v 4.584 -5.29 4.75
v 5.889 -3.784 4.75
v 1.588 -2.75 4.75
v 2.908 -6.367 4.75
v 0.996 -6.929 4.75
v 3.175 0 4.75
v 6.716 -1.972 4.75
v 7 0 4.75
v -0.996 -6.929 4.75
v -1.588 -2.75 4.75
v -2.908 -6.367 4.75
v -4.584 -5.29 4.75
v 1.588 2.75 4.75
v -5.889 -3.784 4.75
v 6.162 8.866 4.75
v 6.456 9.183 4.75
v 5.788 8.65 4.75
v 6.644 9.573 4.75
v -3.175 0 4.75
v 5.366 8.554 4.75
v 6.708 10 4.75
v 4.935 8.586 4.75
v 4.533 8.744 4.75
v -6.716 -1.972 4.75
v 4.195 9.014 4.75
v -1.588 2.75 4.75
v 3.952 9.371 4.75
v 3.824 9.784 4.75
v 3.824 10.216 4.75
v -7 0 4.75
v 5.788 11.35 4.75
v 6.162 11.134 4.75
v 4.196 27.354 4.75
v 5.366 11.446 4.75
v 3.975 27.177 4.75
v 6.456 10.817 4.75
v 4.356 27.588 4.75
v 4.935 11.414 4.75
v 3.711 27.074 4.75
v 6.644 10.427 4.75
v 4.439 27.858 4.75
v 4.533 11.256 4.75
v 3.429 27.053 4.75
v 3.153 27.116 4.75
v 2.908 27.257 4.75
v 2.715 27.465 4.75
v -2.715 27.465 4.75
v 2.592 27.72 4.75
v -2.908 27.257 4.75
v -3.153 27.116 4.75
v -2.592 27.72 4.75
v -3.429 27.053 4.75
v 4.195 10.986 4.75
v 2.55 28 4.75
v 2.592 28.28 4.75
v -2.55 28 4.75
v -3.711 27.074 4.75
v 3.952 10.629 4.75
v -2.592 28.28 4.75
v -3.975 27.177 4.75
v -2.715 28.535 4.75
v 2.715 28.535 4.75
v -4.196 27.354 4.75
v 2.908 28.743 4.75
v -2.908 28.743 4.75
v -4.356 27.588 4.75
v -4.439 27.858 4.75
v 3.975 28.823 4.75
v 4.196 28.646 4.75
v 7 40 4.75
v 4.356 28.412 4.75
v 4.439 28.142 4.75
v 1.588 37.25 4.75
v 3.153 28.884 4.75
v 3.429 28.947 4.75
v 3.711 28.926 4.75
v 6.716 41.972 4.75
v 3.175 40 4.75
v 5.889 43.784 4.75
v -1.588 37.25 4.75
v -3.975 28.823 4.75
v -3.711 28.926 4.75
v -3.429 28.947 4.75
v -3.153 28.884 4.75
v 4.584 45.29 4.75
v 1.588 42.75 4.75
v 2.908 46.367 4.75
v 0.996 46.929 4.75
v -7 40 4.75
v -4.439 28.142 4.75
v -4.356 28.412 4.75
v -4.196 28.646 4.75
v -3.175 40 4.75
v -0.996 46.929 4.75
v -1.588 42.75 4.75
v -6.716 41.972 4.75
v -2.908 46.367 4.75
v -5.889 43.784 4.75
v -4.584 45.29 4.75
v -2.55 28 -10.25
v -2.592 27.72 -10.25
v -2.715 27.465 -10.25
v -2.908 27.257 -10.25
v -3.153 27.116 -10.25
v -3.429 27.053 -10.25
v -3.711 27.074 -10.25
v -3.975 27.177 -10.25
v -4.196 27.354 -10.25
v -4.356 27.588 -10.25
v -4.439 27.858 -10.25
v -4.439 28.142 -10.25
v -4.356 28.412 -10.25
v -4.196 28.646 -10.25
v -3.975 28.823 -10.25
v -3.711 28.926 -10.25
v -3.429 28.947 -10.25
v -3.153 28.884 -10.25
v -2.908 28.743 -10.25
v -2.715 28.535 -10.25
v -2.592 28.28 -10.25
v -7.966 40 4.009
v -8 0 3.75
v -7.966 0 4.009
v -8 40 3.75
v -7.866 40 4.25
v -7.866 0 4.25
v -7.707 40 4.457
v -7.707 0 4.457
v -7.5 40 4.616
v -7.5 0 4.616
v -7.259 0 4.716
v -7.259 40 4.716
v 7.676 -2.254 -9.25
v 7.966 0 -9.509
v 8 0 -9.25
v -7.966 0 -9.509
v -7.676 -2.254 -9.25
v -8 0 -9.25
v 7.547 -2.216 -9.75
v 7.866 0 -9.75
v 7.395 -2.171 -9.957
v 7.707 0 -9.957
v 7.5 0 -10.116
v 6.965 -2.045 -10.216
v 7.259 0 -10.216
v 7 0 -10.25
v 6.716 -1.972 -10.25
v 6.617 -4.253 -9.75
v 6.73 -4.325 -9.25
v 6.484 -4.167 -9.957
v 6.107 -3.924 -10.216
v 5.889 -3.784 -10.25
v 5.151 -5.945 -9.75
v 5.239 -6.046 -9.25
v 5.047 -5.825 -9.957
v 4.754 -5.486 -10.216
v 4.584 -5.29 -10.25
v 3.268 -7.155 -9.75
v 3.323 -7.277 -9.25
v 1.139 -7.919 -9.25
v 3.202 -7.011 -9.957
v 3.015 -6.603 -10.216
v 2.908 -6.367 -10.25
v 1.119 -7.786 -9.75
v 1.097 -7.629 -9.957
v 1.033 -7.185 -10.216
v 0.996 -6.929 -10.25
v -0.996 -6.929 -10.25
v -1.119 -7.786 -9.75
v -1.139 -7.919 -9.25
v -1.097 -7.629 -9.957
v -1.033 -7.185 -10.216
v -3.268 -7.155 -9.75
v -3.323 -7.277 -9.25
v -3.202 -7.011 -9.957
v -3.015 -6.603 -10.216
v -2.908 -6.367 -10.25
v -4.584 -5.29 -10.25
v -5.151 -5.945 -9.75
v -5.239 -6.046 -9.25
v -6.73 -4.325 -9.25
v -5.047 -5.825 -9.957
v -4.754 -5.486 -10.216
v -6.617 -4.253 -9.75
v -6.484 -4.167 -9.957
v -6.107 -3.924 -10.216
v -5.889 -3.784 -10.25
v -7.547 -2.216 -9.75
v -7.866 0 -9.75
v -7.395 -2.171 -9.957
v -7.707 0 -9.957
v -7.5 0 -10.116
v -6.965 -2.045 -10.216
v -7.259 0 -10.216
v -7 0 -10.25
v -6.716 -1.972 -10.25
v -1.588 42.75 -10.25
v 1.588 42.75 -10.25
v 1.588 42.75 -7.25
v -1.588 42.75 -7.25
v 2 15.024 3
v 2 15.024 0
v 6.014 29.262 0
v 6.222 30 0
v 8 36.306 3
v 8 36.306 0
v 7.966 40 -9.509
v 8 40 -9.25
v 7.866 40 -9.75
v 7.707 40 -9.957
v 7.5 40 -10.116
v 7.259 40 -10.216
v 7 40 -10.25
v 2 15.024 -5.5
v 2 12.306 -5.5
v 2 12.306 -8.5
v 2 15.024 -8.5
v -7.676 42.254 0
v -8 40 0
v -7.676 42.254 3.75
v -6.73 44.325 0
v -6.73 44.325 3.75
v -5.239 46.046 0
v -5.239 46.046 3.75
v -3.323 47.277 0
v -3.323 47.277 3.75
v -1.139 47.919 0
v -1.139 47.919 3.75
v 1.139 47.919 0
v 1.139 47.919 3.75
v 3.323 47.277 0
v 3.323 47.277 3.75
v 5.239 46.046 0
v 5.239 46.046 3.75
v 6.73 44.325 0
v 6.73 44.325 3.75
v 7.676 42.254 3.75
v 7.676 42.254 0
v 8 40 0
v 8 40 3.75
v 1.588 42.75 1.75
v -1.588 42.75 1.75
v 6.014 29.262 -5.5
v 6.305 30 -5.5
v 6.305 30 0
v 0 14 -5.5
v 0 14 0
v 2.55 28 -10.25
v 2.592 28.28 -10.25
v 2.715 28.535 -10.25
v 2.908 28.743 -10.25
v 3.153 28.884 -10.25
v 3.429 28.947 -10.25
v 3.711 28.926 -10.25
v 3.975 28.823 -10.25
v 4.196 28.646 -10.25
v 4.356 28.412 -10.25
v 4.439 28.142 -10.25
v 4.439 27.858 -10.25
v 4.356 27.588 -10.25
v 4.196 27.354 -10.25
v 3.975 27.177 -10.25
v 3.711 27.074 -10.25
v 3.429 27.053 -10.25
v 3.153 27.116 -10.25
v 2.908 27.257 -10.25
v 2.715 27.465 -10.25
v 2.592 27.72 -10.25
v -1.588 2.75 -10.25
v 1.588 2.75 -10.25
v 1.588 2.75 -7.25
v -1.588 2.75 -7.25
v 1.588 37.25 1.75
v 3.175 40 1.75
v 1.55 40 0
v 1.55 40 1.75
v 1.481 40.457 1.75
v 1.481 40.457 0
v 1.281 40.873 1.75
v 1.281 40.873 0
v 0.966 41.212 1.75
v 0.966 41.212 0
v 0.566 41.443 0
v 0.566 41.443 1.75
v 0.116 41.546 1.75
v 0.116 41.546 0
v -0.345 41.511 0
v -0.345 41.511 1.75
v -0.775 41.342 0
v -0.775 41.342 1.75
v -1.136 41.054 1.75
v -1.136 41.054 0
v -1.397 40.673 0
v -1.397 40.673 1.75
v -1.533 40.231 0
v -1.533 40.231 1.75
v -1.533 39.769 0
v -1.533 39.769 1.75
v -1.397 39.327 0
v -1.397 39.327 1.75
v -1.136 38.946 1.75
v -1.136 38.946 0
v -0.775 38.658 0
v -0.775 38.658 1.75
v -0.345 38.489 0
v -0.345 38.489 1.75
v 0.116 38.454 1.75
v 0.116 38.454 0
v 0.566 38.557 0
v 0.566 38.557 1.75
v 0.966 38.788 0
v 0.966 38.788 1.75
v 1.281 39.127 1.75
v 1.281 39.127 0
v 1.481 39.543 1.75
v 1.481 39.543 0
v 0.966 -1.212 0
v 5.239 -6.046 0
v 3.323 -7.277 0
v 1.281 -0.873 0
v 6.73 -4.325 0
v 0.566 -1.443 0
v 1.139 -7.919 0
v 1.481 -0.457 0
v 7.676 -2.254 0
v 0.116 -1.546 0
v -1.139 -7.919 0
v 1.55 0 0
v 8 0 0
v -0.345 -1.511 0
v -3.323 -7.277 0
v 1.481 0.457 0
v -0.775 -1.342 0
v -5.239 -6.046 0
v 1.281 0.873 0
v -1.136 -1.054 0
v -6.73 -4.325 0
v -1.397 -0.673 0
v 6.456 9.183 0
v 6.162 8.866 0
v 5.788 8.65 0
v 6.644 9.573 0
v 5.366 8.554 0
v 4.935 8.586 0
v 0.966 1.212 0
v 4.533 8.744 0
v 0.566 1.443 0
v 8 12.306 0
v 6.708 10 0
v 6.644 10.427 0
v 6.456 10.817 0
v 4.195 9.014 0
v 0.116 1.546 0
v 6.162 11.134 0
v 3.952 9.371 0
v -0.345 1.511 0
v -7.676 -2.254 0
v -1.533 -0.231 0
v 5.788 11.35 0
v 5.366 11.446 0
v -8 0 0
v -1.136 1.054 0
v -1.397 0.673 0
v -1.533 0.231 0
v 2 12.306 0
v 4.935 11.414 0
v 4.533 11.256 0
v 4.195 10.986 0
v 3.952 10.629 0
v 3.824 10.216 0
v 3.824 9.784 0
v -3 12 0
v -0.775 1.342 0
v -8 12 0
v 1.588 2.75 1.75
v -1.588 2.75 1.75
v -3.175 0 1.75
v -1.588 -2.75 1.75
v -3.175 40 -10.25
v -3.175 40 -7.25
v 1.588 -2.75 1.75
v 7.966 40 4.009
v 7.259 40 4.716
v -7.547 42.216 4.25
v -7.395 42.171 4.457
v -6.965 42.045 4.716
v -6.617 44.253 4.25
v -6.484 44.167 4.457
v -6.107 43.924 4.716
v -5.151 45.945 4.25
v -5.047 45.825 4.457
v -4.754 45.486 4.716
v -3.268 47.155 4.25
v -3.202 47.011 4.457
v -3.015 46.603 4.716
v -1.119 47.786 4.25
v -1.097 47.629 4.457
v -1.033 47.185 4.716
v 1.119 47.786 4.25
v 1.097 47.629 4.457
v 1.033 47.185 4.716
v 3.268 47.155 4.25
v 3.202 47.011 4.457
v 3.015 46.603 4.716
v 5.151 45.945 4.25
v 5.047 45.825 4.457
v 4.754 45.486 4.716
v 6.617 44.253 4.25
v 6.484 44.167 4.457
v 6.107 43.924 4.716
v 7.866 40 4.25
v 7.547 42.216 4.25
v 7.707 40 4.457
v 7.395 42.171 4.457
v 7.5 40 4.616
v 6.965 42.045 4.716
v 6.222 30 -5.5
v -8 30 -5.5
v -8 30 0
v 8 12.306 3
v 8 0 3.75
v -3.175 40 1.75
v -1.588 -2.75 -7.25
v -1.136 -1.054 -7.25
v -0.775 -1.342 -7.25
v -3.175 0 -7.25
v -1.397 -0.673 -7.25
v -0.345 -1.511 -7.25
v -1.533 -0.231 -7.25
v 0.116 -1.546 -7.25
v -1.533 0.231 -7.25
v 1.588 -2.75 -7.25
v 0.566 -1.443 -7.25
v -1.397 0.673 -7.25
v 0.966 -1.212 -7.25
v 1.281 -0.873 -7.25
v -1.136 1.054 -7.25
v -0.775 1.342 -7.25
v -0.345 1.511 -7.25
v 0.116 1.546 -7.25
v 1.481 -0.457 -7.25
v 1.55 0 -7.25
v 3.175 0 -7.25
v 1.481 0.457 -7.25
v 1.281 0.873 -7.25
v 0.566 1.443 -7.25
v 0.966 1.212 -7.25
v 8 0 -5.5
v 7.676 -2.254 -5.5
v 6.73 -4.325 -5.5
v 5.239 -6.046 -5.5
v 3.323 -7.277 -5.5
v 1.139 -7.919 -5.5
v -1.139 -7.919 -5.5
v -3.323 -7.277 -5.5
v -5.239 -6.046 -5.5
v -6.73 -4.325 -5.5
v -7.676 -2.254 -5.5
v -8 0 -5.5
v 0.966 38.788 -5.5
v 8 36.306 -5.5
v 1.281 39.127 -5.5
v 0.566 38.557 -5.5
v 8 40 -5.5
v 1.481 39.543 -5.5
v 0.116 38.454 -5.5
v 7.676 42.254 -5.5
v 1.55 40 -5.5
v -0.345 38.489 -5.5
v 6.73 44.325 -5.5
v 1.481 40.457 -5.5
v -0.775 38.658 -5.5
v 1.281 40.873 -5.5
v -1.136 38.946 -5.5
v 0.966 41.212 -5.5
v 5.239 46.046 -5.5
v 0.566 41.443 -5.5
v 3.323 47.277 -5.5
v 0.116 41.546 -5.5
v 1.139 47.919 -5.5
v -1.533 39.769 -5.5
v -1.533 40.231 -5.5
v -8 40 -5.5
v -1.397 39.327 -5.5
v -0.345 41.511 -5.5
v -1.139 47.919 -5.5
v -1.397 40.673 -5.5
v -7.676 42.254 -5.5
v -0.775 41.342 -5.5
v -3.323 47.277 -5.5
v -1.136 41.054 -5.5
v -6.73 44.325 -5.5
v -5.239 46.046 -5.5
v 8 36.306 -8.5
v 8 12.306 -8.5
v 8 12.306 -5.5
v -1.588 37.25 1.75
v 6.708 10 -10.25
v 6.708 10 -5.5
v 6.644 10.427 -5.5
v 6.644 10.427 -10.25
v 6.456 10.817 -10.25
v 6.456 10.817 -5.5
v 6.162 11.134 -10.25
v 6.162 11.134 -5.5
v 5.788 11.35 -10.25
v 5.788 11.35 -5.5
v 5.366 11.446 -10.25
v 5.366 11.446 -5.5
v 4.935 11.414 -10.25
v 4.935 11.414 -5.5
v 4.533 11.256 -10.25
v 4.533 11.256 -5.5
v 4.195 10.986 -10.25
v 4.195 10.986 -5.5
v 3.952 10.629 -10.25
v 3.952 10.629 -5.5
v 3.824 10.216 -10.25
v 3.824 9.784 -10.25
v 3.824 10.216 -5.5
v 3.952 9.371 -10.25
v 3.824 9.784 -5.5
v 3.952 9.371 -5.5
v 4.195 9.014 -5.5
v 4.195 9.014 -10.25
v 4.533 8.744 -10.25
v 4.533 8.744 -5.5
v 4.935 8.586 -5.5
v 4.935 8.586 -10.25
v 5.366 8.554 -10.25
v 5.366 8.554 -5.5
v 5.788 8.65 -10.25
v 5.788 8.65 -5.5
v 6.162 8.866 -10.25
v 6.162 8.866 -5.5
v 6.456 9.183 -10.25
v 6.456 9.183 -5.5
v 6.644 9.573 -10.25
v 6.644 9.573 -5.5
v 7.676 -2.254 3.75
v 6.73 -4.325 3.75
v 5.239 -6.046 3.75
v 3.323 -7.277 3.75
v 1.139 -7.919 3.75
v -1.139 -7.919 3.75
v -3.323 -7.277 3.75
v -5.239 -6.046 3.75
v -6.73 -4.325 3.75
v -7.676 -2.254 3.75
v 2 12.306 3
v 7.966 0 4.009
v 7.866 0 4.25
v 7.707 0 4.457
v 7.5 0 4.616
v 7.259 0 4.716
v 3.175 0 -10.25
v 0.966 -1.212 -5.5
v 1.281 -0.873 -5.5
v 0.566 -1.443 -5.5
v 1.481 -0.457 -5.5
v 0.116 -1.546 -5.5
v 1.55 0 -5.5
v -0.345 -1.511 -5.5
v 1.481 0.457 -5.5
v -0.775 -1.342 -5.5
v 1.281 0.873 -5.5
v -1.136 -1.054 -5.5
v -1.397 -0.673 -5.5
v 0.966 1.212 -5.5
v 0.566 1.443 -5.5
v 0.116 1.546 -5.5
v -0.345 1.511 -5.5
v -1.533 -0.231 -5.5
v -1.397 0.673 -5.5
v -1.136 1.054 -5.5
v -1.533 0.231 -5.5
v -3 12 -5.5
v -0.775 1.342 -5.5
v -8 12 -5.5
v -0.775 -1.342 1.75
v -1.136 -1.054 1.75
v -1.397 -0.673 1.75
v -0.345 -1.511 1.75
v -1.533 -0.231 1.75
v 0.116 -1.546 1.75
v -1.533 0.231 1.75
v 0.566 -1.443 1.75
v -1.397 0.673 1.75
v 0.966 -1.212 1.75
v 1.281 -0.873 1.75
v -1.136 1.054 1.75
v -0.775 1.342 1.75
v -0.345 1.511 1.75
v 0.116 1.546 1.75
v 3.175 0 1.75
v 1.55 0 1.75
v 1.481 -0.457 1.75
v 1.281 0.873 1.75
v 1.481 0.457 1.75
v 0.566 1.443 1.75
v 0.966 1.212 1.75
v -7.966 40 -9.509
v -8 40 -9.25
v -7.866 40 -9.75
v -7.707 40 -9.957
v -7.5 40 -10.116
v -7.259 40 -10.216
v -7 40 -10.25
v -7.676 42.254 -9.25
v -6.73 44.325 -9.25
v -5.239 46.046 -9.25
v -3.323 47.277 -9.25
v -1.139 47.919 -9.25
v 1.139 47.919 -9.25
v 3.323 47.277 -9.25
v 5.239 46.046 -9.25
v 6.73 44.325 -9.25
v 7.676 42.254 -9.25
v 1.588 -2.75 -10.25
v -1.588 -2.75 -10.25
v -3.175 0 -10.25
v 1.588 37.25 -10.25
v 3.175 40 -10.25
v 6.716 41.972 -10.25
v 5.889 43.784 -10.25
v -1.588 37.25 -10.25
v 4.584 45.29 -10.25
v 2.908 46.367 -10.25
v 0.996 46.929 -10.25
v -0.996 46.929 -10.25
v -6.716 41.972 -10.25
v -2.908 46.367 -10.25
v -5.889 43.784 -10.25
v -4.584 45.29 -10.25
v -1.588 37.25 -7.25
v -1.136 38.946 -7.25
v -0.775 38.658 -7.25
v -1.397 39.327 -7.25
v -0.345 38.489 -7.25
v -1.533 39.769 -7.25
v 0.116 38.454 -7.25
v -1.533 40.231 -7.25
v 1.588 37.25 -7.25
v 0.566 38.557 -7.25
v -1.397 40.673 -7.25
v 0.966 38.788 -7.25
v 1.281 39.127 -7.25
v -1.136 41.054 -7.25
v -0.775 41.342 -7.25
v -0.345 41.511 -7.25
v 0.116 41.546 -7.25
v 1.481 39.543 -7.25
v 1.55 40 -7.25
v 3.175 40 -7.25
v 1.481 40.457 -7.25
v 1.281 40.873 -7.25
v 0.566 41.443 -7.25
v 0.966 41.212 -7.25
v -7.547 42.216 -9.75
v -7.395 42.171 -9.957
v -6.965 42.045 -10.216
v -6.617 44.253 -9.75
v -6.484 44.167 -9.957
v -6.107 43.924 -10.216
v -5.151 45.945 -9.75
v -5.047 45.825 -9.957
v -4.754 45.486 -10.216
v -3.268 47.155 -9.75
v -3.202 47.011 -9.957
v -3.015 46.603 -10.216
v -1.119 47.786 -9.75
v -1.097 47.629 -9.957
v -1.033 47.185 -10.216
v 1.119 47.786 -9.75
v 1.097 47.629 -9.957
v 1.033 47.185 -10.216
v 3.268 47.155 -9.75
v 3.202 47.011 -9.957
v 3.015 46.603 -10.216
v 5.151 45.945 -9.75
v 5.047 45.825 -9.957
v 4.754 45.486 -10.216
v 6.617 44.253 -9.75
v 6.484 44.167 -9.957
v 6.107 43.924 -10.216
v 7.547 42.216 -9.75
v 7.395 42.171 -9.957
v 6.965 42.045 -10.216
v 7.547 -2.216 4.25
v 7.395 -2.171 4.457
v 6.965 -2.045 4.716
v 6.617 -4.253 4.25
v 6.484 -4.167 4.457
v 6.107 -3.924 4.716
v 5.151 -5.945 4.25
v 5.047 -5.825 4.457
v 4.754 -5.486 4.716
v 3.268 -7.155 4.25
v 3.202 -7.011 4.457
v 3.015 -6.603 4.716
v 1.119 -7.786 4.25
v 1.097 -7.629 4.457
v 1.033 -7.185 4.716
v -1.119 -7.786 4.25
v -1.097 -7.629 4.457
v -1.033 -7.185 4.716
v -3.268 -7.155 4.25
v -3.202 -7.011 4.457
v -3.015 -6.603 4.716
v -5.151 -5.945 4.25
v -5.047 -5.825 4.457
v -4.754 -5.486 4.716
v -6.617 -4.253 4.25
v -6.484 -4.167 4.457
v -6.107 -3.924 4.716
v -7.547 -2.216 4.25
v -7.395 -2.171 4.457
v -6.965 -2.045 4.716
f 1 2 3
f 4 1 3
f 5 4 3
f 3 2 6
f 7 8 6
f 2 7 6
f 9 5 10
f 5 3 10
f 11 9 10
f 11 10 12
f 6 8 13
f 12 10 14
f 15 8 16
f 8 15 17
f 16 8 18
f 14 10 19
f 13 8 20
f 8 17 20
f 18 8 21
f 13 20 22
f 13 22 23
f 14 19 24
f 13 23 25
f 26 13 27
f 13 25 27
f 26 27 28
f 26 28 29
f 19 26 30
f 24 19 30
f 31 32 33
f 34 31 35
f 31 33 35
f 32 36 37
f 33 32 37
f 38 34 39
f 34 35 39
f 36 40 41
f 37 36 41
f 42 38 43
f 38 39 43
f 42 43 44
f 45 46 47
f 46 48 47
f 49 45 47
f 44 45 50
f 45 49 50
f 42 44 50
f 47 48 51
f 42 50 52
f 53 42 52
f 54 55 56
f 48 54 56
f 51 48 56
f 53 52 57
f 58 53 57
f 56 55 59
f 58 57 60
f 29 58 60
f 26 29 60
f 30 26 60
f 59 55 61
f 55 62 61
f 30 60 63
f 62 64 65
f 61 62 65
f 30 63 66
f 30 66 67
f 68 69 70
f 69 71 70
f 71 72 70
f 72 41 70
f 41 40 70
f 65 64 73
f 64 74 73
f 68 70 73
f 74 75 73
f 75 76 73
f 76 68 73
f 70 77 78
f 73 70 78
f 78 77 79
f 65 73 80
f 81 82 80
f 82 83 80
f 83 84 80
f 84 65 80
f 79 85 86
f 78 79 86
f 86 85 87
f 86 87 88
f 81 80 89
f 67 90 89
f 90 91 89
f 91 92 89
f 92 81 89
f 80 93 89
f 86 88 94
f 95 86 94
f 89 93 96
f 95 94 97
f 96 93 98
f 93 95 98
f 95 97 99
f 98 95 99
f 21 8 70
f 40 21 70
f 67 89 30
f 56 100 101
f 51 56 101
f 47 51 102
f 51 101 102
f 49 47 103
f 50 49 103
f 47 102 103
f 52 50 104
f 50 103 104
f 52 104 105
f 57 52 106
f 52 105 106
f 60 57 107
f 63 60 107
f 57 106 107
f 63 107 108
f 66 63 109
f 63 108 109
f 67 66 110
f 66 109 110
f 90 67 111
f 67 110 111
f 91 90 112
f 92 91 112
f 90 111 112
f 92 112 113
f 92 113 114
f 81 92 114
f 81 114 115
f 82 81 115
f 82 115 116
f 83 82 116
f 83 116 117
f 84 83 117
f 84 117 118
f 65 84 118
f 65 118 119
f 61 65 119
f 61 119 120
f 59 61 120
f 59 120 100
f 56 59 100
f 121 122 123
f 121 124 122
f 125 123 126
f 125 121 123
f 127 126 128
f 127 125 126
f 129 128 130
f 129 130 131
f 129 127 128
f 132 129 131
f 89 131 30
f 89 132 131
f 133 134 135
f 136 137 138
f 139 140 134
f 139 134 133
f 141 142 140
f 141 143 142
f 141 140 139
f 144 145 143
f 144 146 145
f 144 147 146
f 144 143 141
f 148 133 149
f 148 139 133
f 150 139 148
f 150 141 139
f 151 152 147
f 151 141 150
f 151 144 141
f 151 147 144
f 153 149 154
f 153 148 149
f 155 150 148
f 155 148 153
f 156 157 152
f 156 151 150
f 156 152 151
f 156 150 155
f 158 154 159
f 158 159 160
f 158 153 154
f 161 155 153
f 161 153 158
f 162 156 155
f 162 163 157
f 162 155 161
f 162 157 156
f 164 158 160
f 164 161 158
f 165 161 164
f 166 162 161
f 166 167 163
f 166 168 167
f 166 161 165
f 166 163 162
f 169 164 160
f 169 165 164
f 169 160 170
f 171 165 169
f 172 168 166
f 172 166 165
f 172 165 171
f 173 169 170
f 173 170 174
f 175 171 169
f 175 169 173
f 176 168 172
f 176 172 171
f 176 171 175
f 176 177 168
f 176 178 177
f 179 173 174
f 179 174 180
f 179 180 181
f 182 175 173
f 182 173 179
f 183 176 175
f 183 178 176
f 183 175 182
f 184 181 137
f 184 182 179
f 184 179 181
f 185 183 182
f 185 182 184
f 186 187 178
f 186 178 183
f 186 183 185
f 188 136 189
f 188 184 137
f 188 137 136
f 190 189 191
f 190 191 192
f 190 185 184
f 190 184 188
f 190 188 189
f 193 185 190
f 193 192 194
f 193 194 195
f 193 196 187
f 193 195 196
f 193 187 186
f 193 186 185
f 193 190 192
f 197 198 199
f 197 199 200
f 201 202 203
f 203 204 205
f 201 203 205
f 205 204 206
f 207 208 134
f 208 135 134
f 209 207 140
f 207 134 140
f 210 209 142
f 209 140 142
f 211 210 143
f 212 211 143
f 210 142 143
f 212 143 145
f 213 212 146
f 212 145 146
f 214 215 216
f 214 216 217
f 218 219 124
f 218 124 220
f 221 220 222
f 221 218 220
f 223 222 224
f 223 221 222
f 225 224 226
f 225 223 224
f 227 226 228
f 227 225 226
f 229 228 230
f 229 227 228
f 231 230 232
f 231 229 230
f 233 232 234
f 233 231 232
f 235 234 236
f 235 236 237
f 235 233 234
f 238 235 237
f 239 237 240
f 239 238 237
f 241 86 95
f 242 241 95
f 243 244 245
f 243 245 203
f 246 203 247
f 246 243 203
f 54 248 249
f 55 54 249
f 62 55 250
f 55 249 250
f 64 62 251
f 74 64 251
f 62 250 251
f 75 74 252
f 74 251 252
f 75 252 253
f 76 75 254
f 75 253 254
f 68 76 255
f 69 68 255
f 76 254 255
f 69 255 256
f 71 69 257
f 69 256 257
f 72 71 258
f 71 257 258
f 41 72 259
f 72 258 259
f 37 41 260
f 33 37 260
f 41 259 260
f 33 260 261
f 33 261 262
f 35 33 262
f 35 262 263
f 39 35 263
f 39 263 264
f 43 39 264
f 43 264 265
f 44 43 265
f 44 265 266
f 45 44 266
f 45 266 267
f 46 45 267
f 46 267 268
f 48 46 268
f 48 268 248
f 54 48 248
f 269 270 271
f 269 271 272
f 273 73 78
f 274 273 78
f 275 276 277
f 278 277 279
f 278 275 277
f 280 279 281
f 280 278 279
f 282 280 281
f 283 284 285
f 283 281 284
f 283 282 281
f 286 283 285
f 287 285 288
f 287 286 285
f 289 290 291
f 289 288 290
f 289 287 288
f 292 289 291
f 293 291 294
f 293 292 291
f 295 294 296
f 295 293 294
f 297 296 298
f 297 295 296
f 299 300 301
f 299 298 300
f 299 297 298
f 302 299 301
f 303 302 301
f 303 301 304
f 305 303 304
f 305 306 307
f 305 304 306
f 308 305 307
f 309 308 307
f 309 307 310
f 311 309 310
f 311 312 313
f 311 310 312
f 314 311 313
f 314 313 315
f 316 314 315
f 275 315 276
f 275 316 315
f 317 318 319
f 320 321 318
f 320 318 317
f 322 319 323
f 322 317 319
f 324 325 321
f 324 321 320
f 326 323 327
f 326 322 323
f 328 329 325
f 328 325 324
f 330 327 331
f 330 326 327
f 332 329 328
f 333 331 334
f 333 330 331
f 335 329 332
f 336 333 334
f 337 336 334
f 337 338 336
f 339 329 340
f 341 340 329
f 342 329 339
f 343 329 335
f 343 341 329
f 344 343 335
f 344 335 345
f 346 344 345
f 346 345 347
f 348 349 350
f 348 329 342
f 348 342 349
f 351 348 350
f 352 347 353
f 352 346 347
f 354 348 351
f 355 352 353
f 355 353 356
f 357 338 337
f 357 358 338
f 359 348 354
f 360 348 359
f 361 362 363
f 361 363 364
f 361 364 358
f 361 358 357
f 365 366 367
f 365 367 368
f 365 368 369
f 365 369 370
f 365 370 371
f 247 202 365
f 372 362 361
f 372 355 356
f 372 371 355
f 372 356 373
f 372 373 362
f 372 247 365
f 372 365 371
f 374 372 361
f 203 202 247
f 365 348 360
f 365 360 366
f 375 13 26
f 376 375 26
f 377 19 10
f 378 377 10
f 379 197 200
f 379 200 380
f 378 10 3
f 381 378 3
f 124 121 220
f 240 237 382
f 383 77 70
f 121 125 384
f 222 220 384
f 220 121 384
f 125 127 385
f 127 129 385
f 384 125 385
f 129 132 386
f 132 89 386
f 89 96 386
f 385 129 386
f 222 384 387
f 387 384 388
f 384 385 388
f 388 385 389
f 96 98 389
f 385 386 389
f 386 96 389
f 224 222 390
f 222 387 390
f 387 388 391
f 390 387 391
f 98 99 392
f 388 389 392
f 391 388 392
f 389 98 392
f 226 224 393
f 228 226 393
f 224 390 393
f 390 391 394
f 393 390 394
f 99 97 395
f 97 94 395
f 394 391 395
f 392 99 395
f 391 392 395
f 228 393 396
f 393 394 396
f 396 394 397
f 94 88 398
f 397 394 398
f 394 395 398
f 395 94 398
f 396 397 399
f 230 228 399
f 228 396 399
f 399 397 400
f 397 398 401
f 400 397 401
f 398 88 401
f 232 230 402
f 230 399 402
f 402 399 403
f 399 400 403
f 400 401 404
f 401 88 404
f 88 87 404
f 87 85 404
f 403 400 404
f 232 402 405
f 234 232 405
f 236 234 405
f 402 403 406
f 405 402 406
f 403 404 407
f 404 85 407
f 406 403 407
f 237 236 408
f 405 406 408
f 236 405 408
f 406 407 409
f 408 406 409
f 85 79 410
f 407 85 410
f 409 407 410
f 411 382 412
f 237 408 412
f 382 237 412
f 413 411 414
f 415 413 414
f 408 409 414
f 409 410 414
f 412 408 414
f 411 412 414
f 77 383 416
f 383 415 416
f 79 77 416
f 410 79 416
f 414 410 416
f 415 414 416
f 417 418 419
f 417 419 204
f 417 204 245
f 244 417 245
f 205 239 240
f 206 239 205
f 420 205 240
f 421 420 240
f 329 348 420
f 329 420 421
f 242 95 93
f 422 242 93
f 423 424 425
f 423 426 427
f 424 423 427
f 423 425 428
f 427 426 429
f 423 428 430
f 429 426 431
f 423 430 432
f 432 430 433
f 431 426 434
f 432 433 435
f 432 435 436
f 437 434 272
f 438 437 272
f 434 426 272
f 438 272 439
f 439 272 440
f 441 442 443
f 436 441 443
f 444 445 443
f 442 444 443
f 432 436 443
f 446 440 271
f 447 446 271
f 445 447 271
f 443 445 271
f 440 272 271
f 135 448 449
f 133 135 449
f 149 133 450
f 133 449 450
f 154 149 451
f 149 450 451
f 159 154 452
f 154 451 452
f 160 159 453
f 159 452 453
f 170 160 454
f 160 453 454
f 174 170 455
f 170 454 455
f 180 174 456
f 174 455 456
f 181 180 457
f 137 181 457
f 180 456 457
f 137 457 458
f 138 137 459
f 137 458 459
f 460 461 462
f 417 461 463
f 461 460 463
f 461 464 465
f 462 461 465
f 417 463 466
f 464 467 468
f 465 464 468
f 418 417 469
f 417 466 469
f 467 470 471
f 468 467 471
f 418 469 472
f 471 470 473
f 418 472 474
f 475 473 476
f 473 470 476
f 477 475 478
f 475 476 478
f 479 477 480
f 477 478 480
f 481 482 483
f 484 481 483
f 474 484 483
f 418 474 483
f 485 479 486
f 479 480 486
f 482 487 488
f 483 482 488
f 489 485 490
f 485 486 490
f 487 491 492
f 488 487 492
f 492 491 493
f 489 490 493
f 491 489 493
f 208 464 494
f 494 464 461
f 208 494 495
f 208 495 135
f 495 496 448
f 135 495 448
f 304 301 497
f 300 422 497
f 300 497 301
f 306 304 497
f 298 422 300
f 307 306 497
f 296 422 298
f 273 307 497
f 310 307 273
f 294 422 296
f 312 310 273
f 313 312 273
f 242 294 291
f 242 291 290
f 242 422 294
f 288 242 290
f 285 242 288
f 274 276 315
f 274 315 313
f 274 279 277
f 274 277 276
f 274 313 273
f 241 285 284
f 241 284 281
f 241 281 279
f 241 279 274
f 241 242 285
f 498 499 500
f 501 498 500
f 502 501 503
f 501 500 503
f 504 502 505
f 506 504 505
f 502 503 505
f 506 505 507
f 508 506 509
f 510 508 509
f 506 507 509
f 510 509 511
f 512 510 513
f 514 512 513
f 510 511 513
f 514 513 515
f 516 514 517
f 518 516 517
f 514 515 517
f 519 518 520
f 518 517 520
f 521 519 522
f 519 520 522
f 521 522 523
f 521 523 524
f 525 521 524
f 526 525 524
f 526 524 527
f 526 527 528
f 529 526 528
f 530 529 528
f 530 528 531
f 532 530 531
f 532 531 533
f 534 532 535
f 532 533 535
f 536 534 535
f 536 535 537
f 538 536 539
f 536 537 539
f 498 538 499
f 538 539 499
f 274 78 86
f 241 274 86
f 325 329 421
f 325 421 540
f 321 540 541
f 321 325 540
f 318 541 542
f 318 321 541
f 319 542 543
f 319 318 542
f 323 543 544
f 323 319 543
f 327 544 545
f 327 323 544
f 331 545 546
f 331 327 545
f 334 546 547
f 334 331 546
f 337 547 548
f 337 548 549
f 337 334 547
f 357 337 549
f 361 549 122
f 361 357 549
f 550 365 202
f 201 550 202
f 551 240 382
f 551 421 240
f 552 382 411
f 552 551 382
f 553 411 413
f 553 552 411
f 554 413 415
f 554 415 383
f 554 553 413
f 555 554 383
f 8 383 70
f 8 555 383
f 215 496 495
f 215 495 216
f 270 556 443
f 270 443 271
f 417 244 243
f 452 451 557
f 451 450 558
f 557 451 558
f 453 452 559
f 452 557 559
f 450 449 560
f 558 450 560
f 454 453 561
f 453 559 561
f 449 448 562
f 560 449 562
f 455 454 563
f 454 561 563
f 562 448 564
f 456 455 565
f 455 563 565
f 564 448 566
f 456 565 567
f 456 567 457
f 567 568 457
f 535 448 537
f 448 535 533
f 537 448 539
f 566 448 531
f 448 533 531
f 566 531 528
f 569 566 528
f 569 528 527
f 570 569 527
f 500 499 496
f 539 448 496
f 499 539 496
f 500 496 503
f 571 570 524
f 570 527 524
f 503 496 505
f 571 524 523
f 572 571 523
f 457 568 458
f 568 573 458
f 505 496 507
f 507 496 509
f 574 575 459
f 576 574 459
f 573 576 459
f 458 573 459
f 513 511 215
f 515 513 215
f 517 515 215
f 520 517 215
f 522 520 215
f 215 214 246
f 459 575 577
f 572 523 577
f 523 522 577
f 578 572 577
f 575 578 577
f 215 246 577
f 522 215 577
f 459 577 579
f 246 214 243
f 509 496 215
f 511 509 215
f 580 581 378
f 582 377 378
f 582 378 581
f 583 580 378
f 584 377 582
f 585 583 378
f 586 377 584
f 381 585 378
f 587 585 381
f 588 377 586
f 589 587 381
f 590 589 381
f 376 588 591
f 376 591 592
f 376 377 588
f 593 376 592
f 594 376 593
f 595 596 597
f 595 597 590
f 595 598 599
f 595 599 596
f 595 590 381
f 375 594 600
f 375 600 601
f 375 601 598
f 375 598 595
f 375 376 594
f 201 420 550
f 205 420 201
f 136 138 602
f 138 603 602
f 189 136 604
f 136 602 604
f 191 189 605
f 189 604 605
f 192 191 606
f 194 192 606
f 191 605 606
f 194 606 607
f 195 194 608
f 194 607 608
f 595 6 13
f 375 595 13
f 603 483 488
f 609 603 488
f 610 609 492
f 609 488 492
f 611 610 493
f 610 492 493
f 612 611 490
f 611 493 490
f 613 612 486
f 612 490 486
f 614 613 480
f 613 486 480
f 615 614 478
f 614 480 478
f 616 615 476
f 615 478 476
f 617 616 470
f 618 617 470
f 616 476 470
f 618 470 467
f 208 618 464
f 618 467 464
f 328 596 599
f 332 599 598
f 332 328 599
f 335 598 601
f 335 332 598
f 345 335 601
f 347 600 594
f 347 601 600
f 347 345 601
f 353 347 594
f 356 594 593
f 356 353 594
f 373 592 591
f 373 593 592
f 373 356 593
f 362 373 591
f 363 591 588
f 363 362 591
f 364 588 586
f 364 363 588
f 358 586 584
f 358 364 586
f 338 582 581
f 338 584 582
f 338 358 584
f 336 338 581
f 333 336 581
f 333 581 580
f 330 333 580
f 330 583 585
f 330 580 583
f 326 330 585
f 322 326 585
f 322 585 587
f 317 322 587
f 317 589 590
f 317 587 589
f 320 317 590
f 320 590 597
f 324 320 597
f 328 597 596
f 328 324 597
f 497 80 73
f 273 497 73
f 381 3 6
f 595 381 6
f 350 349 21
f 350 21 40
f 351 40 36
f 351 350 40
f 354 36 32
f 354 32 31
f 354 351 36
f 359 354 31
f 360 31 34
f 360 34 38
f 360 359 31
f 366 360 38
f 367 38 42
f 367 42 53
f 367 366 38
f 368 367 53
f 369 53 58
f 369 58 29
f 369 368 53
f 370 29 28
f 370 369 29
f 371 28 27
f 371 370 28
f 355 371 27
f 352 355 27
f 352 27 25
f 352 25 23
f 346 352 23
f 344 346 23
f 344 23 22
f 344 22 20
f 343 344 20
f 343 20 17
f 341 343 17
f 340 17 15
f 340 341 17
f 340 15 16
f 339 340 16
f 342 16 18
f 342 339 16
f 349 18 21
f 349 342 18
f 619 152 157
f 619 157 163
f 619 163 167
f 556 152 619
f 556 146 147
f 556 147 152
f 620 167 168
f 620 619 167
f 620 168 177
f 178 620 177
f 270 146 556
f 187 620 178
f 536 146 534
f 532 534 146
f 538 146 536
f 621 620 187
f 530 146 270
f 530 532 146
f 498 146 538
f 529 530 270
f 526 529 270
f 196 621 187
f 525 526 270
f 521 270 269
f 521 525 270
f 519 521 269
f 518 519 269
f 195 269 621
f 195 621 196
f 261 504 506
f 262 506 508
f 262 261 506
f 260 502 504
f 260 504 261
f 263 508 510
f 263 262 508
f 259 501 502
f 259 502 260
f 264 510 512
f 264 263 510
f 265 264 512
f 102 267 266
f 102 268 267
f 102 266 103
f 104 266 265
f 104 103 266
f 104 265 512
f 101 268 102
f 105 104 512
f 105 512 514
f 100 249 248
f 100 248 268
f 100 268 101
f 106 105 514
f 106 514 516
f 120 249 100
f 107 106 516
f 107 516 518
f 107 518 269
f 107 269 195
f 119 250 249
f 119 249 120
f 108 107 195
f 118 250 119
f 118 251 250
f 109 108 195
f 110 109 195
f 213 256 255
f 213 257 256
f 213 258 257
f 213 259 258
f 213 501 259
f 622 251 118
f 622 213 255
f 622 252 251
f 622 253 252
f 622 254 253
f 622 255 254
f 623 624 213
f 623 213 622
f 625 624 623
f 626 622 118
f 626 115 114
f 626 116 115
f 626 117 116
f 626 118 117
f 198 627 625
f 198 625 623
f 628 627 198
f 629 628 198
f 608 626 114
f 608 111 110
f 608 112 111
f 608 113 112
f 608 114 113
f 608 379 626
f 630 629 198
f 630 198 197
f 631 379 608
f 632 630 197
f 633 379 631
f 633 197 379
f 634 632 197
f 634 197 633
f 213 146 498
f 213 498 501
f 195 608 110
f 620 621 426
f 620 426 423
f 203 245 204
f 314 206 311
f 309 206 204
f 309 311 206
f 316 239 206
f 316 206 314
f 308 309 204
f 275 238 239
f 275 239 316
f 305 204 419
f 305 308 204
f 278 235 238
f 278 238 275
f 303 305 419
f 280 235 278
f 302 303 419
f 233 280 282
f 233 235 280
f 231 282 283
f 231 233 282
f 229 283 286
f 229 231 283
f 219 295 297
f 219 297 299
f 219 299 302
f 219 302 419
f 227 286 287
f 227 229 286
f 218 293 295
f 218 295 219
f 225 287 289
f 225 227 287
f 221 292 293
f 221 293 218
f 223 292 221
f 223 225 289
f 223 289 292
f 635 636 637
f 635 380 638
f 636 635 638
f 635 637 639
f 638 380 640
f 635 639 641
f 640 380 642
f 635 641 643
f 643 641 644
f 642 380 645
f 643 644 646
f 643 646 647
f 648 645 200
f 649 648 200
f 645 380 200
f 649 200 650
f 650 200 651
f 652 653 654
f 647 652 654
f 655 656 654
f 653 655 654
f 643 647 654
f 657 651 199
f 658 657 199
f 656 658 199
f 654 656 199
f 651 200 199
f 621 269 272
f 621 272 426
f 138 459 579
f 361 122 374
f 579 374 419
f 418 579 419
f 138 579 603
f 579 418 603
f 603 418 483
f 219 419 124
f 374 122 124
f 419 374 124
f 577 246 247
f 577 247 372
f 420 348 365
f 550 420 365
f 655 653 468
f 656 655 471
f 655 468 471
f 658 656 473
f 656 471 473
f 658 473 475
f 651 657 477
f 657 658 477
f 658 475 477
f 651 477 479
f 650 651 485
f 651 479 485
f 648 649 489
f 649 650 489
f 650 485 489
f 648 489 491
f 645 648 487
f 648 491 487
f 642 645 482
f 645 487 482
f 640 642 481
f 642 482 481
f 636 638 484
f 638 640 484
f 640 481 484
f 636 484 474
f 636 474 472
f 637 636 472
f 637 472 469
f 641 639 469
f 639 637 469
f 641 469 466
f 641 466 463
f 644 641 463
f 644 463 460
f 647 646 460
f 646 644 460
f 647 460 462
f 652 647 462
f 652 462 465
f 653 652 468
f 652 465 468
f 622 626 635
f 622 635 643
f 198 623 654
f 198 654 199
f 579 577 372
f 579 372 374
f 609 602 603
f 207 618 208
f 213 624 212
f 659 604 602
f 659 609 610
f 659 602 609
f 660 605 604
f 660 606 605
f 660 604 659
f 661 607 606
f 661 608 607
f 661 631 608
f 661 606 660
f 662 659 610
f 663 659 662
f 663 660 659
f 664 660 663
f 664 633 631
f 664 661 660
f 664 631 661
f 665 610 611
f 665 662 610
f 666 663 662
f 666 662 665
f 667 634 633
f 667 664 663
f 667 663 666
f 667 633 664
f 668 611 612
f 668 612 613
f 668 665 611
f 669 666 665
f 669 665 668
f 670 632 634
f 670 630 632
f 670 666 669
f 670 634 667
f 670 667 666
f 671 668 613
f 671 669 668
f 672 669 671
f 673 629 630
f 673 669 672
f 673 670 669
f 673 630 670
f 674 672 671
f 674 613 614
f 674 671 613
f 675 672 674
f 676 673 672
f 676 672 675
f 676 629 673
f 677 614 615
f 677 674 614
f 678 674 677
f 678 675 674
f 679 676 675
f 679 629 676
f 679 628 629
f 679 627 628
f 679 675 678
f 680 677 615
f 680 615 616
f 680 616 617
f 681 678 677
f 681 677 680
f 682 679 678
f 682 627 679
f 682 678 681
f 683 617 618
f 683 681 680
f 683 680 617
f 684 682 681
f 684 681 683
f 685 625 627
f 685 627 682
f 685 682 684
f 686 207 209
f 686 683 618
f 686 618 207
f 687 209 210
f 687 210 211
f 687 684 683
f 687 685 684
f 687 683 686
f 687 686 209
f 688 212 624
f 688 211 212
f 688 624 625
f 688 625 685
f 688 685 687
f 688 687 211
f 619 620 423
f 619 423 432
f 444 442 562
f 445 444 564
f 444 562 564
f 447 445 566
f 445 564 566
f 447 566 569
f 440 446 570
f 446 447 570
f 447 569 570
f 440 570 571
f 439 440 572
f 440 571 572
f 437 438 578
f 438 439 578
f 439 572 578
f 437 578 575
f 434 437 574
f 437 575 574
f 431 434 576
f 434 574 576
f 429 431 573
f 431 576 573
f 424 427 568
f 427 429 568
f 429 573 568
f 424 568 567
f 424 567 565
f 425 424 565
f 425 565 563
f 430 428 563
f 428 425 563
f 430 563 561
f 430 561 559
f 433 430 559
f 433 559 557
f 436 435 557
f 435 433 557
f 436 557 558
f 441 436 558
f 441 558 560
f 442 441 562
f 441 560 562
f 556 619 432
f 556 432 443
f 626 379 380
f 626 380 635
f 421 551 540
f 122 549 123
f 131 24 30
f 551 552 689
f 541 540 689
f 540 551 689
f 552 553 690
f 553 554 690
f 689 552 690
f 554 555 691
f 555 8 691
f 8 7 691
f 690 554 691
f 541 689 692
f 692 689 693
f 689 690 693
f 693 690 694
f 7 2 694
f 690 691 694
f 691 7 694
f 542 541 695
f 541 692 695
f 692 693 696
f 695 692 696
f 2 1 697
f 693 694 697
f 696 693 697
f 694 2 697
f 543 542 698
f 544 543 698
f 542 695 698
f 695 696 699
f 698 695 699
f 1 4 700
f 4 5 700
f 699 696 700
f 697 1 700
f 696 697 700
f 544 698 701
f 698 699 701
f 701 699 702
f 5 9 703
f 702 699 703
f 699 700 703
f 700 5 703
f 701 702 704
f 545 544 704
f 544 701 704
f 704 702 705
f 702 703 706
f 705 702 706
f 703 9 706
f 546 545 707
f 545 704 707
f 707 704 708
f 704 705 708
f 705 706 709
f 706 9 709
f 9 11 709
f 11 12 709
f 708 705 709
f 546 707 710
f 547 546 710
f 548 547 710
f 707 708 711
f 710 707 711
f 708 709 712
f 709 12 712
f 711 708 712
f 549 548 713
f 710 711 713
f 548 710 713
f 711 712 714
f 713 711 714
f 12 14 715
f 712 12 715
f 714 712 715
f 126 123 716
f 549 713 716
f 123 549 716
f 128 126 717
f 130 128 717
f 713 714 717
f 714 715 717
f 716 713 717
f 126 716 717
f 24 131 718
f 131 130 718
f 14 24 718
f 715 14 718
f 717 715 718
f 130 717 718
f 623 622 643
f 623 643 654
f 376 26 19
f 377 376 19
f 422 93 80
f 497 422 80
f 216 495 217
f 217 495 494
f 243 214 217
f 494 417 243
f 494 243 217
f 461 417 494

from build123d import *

# Parameters (mm, degrees)
SKETCH1_R           = 1.55
SKETCH1_R_2         = 1.45
BOSS_EXTRUDE1_DEPTH = 4.75
FILLET2_R           = 1
CUT_EXTRUDE1_DEPTH  = 3
BOSS_EXTRUDE2_DEPTH = 2.75
CUT_EXTRUDE2_DEPTH  = 3
SKETCH7_R           = 0.95
CUT_EXTRUDE3_DEPTH  = 51.921508226


with BuildPart() as part:
    # Sketch1 → Boss-Extrude1 (new body)
    with BuildSketch(Plane.XY):
        with BuildLine():
            Line((-8, 0), (-8, 40))
            ThreePointArc((-8, 40), (0, 48), (8, 40))
            Line((8, 40), (8, 0))
            ThreePointArc((8, 0), (0, -8), (-8, 0))
        make_face()
        with Locations((0, 40)):
            Circle(SKETCH1_R, mode=Mode.SUBTRACT)
        Circle(SKETCH1_R, mode=Mode.SUBTRACT)
        with Locations((5.258025032, 10)):
            Circle(SKETCH1_R_2, mode=Mode.SUBTRACT)
    extrude(amount=BOSS_EXTRUDE1_DEPTH)

    # Fillet2
    fillet2_edges = [part.edges().sort_by_distance(p)[0] for p in [
        (0, 48, 4.75),
        (-8, 20, 4.75),
        (0, -8, 4.75),
        (8, 20, 4.75),
    ]]
    fillet(fillet2_edges, radius=FILLET2_R)

    # Sketch2 → Cut-Extrude1 (cut)
    with BuildSketch(Plane.XY.offset(4.75)):
        Polygon((3.175426481, 40), (1.58771324, 42.75), (-1.58771324, 42.75), (-3.175426481, 40), (-1.58771324, 37.25), (1.58771324, 37.25), align=None)
        Polygon((3.175426481, 0), (1.58771324, 2.75), (-1.58771324, 2.75), (-3.175426481, 0), (-1.58771324, -2.75), (1.58771324, -2.75), align=None)
    extrude(amount=-CUT_EXTRUDE1_DEPTH, mode=Mode.SUBTRACT)

    # Sketch3 → Boss-Extrude2 (add)
    with BuildSketch(Plane(origin=(0, 0, 0), x_dir=(-1, 0, 0), z_dir=(0, 0, -1))):
        Polygon((8, 30), (3, 30), (-6.304970195, 30), (0, 14), (3, 12), (8, 12), align=None)
    extrude(amount=BOSS_EXTRUDE2_DEPTH)

    # Mirror5: part across plane


with BuildPart() as part_1:
    add(part.part)
    add(part.part.mirror(Plane.XY.offset(-2.75)))

    # Sketch4 → Cut-Extrude2 (cut)
    with BuildSketch(Plane.XY.offset(-5.5)):
        Polygon((2, 12.305922059), (2, 15.02352233), (8, 36.305922059), (8, 12.305922059), align=None)
    cut_extrude2 = extrude(amount=-CUT_EXTRUDE2_DEPTH, mode=Mode.SUBTRACT)

    # Mirror6: Cut-Extrude2 across plane
    add(cut_extrude2.mirror(Plane(origin=(0, 0, -2.75), x_dir=(1, 0, 0), z_dir=(0, 0, -1))), mode=Mode.SUBTRACT)

    # Sketch7 → Cut-Extrude3 (cut, through all)
    with BuildSketch(Plane(origin=(0, 0, -10.25), x_dir=(-1, 0, 0), z_dir=(0, 0, -1))):
        with Locations((-3.5, 28)):
            Circle(SKETCH7_R)
        with Locations(Location((3.5, 28, 0), (0, 0, 180))):
            Circle(SKETCH7_R)
    extrude(amount=-CUT_EXTRUDE3_DEPTH, mode=Mode.SUBTRACT)


solid = part_1.part
